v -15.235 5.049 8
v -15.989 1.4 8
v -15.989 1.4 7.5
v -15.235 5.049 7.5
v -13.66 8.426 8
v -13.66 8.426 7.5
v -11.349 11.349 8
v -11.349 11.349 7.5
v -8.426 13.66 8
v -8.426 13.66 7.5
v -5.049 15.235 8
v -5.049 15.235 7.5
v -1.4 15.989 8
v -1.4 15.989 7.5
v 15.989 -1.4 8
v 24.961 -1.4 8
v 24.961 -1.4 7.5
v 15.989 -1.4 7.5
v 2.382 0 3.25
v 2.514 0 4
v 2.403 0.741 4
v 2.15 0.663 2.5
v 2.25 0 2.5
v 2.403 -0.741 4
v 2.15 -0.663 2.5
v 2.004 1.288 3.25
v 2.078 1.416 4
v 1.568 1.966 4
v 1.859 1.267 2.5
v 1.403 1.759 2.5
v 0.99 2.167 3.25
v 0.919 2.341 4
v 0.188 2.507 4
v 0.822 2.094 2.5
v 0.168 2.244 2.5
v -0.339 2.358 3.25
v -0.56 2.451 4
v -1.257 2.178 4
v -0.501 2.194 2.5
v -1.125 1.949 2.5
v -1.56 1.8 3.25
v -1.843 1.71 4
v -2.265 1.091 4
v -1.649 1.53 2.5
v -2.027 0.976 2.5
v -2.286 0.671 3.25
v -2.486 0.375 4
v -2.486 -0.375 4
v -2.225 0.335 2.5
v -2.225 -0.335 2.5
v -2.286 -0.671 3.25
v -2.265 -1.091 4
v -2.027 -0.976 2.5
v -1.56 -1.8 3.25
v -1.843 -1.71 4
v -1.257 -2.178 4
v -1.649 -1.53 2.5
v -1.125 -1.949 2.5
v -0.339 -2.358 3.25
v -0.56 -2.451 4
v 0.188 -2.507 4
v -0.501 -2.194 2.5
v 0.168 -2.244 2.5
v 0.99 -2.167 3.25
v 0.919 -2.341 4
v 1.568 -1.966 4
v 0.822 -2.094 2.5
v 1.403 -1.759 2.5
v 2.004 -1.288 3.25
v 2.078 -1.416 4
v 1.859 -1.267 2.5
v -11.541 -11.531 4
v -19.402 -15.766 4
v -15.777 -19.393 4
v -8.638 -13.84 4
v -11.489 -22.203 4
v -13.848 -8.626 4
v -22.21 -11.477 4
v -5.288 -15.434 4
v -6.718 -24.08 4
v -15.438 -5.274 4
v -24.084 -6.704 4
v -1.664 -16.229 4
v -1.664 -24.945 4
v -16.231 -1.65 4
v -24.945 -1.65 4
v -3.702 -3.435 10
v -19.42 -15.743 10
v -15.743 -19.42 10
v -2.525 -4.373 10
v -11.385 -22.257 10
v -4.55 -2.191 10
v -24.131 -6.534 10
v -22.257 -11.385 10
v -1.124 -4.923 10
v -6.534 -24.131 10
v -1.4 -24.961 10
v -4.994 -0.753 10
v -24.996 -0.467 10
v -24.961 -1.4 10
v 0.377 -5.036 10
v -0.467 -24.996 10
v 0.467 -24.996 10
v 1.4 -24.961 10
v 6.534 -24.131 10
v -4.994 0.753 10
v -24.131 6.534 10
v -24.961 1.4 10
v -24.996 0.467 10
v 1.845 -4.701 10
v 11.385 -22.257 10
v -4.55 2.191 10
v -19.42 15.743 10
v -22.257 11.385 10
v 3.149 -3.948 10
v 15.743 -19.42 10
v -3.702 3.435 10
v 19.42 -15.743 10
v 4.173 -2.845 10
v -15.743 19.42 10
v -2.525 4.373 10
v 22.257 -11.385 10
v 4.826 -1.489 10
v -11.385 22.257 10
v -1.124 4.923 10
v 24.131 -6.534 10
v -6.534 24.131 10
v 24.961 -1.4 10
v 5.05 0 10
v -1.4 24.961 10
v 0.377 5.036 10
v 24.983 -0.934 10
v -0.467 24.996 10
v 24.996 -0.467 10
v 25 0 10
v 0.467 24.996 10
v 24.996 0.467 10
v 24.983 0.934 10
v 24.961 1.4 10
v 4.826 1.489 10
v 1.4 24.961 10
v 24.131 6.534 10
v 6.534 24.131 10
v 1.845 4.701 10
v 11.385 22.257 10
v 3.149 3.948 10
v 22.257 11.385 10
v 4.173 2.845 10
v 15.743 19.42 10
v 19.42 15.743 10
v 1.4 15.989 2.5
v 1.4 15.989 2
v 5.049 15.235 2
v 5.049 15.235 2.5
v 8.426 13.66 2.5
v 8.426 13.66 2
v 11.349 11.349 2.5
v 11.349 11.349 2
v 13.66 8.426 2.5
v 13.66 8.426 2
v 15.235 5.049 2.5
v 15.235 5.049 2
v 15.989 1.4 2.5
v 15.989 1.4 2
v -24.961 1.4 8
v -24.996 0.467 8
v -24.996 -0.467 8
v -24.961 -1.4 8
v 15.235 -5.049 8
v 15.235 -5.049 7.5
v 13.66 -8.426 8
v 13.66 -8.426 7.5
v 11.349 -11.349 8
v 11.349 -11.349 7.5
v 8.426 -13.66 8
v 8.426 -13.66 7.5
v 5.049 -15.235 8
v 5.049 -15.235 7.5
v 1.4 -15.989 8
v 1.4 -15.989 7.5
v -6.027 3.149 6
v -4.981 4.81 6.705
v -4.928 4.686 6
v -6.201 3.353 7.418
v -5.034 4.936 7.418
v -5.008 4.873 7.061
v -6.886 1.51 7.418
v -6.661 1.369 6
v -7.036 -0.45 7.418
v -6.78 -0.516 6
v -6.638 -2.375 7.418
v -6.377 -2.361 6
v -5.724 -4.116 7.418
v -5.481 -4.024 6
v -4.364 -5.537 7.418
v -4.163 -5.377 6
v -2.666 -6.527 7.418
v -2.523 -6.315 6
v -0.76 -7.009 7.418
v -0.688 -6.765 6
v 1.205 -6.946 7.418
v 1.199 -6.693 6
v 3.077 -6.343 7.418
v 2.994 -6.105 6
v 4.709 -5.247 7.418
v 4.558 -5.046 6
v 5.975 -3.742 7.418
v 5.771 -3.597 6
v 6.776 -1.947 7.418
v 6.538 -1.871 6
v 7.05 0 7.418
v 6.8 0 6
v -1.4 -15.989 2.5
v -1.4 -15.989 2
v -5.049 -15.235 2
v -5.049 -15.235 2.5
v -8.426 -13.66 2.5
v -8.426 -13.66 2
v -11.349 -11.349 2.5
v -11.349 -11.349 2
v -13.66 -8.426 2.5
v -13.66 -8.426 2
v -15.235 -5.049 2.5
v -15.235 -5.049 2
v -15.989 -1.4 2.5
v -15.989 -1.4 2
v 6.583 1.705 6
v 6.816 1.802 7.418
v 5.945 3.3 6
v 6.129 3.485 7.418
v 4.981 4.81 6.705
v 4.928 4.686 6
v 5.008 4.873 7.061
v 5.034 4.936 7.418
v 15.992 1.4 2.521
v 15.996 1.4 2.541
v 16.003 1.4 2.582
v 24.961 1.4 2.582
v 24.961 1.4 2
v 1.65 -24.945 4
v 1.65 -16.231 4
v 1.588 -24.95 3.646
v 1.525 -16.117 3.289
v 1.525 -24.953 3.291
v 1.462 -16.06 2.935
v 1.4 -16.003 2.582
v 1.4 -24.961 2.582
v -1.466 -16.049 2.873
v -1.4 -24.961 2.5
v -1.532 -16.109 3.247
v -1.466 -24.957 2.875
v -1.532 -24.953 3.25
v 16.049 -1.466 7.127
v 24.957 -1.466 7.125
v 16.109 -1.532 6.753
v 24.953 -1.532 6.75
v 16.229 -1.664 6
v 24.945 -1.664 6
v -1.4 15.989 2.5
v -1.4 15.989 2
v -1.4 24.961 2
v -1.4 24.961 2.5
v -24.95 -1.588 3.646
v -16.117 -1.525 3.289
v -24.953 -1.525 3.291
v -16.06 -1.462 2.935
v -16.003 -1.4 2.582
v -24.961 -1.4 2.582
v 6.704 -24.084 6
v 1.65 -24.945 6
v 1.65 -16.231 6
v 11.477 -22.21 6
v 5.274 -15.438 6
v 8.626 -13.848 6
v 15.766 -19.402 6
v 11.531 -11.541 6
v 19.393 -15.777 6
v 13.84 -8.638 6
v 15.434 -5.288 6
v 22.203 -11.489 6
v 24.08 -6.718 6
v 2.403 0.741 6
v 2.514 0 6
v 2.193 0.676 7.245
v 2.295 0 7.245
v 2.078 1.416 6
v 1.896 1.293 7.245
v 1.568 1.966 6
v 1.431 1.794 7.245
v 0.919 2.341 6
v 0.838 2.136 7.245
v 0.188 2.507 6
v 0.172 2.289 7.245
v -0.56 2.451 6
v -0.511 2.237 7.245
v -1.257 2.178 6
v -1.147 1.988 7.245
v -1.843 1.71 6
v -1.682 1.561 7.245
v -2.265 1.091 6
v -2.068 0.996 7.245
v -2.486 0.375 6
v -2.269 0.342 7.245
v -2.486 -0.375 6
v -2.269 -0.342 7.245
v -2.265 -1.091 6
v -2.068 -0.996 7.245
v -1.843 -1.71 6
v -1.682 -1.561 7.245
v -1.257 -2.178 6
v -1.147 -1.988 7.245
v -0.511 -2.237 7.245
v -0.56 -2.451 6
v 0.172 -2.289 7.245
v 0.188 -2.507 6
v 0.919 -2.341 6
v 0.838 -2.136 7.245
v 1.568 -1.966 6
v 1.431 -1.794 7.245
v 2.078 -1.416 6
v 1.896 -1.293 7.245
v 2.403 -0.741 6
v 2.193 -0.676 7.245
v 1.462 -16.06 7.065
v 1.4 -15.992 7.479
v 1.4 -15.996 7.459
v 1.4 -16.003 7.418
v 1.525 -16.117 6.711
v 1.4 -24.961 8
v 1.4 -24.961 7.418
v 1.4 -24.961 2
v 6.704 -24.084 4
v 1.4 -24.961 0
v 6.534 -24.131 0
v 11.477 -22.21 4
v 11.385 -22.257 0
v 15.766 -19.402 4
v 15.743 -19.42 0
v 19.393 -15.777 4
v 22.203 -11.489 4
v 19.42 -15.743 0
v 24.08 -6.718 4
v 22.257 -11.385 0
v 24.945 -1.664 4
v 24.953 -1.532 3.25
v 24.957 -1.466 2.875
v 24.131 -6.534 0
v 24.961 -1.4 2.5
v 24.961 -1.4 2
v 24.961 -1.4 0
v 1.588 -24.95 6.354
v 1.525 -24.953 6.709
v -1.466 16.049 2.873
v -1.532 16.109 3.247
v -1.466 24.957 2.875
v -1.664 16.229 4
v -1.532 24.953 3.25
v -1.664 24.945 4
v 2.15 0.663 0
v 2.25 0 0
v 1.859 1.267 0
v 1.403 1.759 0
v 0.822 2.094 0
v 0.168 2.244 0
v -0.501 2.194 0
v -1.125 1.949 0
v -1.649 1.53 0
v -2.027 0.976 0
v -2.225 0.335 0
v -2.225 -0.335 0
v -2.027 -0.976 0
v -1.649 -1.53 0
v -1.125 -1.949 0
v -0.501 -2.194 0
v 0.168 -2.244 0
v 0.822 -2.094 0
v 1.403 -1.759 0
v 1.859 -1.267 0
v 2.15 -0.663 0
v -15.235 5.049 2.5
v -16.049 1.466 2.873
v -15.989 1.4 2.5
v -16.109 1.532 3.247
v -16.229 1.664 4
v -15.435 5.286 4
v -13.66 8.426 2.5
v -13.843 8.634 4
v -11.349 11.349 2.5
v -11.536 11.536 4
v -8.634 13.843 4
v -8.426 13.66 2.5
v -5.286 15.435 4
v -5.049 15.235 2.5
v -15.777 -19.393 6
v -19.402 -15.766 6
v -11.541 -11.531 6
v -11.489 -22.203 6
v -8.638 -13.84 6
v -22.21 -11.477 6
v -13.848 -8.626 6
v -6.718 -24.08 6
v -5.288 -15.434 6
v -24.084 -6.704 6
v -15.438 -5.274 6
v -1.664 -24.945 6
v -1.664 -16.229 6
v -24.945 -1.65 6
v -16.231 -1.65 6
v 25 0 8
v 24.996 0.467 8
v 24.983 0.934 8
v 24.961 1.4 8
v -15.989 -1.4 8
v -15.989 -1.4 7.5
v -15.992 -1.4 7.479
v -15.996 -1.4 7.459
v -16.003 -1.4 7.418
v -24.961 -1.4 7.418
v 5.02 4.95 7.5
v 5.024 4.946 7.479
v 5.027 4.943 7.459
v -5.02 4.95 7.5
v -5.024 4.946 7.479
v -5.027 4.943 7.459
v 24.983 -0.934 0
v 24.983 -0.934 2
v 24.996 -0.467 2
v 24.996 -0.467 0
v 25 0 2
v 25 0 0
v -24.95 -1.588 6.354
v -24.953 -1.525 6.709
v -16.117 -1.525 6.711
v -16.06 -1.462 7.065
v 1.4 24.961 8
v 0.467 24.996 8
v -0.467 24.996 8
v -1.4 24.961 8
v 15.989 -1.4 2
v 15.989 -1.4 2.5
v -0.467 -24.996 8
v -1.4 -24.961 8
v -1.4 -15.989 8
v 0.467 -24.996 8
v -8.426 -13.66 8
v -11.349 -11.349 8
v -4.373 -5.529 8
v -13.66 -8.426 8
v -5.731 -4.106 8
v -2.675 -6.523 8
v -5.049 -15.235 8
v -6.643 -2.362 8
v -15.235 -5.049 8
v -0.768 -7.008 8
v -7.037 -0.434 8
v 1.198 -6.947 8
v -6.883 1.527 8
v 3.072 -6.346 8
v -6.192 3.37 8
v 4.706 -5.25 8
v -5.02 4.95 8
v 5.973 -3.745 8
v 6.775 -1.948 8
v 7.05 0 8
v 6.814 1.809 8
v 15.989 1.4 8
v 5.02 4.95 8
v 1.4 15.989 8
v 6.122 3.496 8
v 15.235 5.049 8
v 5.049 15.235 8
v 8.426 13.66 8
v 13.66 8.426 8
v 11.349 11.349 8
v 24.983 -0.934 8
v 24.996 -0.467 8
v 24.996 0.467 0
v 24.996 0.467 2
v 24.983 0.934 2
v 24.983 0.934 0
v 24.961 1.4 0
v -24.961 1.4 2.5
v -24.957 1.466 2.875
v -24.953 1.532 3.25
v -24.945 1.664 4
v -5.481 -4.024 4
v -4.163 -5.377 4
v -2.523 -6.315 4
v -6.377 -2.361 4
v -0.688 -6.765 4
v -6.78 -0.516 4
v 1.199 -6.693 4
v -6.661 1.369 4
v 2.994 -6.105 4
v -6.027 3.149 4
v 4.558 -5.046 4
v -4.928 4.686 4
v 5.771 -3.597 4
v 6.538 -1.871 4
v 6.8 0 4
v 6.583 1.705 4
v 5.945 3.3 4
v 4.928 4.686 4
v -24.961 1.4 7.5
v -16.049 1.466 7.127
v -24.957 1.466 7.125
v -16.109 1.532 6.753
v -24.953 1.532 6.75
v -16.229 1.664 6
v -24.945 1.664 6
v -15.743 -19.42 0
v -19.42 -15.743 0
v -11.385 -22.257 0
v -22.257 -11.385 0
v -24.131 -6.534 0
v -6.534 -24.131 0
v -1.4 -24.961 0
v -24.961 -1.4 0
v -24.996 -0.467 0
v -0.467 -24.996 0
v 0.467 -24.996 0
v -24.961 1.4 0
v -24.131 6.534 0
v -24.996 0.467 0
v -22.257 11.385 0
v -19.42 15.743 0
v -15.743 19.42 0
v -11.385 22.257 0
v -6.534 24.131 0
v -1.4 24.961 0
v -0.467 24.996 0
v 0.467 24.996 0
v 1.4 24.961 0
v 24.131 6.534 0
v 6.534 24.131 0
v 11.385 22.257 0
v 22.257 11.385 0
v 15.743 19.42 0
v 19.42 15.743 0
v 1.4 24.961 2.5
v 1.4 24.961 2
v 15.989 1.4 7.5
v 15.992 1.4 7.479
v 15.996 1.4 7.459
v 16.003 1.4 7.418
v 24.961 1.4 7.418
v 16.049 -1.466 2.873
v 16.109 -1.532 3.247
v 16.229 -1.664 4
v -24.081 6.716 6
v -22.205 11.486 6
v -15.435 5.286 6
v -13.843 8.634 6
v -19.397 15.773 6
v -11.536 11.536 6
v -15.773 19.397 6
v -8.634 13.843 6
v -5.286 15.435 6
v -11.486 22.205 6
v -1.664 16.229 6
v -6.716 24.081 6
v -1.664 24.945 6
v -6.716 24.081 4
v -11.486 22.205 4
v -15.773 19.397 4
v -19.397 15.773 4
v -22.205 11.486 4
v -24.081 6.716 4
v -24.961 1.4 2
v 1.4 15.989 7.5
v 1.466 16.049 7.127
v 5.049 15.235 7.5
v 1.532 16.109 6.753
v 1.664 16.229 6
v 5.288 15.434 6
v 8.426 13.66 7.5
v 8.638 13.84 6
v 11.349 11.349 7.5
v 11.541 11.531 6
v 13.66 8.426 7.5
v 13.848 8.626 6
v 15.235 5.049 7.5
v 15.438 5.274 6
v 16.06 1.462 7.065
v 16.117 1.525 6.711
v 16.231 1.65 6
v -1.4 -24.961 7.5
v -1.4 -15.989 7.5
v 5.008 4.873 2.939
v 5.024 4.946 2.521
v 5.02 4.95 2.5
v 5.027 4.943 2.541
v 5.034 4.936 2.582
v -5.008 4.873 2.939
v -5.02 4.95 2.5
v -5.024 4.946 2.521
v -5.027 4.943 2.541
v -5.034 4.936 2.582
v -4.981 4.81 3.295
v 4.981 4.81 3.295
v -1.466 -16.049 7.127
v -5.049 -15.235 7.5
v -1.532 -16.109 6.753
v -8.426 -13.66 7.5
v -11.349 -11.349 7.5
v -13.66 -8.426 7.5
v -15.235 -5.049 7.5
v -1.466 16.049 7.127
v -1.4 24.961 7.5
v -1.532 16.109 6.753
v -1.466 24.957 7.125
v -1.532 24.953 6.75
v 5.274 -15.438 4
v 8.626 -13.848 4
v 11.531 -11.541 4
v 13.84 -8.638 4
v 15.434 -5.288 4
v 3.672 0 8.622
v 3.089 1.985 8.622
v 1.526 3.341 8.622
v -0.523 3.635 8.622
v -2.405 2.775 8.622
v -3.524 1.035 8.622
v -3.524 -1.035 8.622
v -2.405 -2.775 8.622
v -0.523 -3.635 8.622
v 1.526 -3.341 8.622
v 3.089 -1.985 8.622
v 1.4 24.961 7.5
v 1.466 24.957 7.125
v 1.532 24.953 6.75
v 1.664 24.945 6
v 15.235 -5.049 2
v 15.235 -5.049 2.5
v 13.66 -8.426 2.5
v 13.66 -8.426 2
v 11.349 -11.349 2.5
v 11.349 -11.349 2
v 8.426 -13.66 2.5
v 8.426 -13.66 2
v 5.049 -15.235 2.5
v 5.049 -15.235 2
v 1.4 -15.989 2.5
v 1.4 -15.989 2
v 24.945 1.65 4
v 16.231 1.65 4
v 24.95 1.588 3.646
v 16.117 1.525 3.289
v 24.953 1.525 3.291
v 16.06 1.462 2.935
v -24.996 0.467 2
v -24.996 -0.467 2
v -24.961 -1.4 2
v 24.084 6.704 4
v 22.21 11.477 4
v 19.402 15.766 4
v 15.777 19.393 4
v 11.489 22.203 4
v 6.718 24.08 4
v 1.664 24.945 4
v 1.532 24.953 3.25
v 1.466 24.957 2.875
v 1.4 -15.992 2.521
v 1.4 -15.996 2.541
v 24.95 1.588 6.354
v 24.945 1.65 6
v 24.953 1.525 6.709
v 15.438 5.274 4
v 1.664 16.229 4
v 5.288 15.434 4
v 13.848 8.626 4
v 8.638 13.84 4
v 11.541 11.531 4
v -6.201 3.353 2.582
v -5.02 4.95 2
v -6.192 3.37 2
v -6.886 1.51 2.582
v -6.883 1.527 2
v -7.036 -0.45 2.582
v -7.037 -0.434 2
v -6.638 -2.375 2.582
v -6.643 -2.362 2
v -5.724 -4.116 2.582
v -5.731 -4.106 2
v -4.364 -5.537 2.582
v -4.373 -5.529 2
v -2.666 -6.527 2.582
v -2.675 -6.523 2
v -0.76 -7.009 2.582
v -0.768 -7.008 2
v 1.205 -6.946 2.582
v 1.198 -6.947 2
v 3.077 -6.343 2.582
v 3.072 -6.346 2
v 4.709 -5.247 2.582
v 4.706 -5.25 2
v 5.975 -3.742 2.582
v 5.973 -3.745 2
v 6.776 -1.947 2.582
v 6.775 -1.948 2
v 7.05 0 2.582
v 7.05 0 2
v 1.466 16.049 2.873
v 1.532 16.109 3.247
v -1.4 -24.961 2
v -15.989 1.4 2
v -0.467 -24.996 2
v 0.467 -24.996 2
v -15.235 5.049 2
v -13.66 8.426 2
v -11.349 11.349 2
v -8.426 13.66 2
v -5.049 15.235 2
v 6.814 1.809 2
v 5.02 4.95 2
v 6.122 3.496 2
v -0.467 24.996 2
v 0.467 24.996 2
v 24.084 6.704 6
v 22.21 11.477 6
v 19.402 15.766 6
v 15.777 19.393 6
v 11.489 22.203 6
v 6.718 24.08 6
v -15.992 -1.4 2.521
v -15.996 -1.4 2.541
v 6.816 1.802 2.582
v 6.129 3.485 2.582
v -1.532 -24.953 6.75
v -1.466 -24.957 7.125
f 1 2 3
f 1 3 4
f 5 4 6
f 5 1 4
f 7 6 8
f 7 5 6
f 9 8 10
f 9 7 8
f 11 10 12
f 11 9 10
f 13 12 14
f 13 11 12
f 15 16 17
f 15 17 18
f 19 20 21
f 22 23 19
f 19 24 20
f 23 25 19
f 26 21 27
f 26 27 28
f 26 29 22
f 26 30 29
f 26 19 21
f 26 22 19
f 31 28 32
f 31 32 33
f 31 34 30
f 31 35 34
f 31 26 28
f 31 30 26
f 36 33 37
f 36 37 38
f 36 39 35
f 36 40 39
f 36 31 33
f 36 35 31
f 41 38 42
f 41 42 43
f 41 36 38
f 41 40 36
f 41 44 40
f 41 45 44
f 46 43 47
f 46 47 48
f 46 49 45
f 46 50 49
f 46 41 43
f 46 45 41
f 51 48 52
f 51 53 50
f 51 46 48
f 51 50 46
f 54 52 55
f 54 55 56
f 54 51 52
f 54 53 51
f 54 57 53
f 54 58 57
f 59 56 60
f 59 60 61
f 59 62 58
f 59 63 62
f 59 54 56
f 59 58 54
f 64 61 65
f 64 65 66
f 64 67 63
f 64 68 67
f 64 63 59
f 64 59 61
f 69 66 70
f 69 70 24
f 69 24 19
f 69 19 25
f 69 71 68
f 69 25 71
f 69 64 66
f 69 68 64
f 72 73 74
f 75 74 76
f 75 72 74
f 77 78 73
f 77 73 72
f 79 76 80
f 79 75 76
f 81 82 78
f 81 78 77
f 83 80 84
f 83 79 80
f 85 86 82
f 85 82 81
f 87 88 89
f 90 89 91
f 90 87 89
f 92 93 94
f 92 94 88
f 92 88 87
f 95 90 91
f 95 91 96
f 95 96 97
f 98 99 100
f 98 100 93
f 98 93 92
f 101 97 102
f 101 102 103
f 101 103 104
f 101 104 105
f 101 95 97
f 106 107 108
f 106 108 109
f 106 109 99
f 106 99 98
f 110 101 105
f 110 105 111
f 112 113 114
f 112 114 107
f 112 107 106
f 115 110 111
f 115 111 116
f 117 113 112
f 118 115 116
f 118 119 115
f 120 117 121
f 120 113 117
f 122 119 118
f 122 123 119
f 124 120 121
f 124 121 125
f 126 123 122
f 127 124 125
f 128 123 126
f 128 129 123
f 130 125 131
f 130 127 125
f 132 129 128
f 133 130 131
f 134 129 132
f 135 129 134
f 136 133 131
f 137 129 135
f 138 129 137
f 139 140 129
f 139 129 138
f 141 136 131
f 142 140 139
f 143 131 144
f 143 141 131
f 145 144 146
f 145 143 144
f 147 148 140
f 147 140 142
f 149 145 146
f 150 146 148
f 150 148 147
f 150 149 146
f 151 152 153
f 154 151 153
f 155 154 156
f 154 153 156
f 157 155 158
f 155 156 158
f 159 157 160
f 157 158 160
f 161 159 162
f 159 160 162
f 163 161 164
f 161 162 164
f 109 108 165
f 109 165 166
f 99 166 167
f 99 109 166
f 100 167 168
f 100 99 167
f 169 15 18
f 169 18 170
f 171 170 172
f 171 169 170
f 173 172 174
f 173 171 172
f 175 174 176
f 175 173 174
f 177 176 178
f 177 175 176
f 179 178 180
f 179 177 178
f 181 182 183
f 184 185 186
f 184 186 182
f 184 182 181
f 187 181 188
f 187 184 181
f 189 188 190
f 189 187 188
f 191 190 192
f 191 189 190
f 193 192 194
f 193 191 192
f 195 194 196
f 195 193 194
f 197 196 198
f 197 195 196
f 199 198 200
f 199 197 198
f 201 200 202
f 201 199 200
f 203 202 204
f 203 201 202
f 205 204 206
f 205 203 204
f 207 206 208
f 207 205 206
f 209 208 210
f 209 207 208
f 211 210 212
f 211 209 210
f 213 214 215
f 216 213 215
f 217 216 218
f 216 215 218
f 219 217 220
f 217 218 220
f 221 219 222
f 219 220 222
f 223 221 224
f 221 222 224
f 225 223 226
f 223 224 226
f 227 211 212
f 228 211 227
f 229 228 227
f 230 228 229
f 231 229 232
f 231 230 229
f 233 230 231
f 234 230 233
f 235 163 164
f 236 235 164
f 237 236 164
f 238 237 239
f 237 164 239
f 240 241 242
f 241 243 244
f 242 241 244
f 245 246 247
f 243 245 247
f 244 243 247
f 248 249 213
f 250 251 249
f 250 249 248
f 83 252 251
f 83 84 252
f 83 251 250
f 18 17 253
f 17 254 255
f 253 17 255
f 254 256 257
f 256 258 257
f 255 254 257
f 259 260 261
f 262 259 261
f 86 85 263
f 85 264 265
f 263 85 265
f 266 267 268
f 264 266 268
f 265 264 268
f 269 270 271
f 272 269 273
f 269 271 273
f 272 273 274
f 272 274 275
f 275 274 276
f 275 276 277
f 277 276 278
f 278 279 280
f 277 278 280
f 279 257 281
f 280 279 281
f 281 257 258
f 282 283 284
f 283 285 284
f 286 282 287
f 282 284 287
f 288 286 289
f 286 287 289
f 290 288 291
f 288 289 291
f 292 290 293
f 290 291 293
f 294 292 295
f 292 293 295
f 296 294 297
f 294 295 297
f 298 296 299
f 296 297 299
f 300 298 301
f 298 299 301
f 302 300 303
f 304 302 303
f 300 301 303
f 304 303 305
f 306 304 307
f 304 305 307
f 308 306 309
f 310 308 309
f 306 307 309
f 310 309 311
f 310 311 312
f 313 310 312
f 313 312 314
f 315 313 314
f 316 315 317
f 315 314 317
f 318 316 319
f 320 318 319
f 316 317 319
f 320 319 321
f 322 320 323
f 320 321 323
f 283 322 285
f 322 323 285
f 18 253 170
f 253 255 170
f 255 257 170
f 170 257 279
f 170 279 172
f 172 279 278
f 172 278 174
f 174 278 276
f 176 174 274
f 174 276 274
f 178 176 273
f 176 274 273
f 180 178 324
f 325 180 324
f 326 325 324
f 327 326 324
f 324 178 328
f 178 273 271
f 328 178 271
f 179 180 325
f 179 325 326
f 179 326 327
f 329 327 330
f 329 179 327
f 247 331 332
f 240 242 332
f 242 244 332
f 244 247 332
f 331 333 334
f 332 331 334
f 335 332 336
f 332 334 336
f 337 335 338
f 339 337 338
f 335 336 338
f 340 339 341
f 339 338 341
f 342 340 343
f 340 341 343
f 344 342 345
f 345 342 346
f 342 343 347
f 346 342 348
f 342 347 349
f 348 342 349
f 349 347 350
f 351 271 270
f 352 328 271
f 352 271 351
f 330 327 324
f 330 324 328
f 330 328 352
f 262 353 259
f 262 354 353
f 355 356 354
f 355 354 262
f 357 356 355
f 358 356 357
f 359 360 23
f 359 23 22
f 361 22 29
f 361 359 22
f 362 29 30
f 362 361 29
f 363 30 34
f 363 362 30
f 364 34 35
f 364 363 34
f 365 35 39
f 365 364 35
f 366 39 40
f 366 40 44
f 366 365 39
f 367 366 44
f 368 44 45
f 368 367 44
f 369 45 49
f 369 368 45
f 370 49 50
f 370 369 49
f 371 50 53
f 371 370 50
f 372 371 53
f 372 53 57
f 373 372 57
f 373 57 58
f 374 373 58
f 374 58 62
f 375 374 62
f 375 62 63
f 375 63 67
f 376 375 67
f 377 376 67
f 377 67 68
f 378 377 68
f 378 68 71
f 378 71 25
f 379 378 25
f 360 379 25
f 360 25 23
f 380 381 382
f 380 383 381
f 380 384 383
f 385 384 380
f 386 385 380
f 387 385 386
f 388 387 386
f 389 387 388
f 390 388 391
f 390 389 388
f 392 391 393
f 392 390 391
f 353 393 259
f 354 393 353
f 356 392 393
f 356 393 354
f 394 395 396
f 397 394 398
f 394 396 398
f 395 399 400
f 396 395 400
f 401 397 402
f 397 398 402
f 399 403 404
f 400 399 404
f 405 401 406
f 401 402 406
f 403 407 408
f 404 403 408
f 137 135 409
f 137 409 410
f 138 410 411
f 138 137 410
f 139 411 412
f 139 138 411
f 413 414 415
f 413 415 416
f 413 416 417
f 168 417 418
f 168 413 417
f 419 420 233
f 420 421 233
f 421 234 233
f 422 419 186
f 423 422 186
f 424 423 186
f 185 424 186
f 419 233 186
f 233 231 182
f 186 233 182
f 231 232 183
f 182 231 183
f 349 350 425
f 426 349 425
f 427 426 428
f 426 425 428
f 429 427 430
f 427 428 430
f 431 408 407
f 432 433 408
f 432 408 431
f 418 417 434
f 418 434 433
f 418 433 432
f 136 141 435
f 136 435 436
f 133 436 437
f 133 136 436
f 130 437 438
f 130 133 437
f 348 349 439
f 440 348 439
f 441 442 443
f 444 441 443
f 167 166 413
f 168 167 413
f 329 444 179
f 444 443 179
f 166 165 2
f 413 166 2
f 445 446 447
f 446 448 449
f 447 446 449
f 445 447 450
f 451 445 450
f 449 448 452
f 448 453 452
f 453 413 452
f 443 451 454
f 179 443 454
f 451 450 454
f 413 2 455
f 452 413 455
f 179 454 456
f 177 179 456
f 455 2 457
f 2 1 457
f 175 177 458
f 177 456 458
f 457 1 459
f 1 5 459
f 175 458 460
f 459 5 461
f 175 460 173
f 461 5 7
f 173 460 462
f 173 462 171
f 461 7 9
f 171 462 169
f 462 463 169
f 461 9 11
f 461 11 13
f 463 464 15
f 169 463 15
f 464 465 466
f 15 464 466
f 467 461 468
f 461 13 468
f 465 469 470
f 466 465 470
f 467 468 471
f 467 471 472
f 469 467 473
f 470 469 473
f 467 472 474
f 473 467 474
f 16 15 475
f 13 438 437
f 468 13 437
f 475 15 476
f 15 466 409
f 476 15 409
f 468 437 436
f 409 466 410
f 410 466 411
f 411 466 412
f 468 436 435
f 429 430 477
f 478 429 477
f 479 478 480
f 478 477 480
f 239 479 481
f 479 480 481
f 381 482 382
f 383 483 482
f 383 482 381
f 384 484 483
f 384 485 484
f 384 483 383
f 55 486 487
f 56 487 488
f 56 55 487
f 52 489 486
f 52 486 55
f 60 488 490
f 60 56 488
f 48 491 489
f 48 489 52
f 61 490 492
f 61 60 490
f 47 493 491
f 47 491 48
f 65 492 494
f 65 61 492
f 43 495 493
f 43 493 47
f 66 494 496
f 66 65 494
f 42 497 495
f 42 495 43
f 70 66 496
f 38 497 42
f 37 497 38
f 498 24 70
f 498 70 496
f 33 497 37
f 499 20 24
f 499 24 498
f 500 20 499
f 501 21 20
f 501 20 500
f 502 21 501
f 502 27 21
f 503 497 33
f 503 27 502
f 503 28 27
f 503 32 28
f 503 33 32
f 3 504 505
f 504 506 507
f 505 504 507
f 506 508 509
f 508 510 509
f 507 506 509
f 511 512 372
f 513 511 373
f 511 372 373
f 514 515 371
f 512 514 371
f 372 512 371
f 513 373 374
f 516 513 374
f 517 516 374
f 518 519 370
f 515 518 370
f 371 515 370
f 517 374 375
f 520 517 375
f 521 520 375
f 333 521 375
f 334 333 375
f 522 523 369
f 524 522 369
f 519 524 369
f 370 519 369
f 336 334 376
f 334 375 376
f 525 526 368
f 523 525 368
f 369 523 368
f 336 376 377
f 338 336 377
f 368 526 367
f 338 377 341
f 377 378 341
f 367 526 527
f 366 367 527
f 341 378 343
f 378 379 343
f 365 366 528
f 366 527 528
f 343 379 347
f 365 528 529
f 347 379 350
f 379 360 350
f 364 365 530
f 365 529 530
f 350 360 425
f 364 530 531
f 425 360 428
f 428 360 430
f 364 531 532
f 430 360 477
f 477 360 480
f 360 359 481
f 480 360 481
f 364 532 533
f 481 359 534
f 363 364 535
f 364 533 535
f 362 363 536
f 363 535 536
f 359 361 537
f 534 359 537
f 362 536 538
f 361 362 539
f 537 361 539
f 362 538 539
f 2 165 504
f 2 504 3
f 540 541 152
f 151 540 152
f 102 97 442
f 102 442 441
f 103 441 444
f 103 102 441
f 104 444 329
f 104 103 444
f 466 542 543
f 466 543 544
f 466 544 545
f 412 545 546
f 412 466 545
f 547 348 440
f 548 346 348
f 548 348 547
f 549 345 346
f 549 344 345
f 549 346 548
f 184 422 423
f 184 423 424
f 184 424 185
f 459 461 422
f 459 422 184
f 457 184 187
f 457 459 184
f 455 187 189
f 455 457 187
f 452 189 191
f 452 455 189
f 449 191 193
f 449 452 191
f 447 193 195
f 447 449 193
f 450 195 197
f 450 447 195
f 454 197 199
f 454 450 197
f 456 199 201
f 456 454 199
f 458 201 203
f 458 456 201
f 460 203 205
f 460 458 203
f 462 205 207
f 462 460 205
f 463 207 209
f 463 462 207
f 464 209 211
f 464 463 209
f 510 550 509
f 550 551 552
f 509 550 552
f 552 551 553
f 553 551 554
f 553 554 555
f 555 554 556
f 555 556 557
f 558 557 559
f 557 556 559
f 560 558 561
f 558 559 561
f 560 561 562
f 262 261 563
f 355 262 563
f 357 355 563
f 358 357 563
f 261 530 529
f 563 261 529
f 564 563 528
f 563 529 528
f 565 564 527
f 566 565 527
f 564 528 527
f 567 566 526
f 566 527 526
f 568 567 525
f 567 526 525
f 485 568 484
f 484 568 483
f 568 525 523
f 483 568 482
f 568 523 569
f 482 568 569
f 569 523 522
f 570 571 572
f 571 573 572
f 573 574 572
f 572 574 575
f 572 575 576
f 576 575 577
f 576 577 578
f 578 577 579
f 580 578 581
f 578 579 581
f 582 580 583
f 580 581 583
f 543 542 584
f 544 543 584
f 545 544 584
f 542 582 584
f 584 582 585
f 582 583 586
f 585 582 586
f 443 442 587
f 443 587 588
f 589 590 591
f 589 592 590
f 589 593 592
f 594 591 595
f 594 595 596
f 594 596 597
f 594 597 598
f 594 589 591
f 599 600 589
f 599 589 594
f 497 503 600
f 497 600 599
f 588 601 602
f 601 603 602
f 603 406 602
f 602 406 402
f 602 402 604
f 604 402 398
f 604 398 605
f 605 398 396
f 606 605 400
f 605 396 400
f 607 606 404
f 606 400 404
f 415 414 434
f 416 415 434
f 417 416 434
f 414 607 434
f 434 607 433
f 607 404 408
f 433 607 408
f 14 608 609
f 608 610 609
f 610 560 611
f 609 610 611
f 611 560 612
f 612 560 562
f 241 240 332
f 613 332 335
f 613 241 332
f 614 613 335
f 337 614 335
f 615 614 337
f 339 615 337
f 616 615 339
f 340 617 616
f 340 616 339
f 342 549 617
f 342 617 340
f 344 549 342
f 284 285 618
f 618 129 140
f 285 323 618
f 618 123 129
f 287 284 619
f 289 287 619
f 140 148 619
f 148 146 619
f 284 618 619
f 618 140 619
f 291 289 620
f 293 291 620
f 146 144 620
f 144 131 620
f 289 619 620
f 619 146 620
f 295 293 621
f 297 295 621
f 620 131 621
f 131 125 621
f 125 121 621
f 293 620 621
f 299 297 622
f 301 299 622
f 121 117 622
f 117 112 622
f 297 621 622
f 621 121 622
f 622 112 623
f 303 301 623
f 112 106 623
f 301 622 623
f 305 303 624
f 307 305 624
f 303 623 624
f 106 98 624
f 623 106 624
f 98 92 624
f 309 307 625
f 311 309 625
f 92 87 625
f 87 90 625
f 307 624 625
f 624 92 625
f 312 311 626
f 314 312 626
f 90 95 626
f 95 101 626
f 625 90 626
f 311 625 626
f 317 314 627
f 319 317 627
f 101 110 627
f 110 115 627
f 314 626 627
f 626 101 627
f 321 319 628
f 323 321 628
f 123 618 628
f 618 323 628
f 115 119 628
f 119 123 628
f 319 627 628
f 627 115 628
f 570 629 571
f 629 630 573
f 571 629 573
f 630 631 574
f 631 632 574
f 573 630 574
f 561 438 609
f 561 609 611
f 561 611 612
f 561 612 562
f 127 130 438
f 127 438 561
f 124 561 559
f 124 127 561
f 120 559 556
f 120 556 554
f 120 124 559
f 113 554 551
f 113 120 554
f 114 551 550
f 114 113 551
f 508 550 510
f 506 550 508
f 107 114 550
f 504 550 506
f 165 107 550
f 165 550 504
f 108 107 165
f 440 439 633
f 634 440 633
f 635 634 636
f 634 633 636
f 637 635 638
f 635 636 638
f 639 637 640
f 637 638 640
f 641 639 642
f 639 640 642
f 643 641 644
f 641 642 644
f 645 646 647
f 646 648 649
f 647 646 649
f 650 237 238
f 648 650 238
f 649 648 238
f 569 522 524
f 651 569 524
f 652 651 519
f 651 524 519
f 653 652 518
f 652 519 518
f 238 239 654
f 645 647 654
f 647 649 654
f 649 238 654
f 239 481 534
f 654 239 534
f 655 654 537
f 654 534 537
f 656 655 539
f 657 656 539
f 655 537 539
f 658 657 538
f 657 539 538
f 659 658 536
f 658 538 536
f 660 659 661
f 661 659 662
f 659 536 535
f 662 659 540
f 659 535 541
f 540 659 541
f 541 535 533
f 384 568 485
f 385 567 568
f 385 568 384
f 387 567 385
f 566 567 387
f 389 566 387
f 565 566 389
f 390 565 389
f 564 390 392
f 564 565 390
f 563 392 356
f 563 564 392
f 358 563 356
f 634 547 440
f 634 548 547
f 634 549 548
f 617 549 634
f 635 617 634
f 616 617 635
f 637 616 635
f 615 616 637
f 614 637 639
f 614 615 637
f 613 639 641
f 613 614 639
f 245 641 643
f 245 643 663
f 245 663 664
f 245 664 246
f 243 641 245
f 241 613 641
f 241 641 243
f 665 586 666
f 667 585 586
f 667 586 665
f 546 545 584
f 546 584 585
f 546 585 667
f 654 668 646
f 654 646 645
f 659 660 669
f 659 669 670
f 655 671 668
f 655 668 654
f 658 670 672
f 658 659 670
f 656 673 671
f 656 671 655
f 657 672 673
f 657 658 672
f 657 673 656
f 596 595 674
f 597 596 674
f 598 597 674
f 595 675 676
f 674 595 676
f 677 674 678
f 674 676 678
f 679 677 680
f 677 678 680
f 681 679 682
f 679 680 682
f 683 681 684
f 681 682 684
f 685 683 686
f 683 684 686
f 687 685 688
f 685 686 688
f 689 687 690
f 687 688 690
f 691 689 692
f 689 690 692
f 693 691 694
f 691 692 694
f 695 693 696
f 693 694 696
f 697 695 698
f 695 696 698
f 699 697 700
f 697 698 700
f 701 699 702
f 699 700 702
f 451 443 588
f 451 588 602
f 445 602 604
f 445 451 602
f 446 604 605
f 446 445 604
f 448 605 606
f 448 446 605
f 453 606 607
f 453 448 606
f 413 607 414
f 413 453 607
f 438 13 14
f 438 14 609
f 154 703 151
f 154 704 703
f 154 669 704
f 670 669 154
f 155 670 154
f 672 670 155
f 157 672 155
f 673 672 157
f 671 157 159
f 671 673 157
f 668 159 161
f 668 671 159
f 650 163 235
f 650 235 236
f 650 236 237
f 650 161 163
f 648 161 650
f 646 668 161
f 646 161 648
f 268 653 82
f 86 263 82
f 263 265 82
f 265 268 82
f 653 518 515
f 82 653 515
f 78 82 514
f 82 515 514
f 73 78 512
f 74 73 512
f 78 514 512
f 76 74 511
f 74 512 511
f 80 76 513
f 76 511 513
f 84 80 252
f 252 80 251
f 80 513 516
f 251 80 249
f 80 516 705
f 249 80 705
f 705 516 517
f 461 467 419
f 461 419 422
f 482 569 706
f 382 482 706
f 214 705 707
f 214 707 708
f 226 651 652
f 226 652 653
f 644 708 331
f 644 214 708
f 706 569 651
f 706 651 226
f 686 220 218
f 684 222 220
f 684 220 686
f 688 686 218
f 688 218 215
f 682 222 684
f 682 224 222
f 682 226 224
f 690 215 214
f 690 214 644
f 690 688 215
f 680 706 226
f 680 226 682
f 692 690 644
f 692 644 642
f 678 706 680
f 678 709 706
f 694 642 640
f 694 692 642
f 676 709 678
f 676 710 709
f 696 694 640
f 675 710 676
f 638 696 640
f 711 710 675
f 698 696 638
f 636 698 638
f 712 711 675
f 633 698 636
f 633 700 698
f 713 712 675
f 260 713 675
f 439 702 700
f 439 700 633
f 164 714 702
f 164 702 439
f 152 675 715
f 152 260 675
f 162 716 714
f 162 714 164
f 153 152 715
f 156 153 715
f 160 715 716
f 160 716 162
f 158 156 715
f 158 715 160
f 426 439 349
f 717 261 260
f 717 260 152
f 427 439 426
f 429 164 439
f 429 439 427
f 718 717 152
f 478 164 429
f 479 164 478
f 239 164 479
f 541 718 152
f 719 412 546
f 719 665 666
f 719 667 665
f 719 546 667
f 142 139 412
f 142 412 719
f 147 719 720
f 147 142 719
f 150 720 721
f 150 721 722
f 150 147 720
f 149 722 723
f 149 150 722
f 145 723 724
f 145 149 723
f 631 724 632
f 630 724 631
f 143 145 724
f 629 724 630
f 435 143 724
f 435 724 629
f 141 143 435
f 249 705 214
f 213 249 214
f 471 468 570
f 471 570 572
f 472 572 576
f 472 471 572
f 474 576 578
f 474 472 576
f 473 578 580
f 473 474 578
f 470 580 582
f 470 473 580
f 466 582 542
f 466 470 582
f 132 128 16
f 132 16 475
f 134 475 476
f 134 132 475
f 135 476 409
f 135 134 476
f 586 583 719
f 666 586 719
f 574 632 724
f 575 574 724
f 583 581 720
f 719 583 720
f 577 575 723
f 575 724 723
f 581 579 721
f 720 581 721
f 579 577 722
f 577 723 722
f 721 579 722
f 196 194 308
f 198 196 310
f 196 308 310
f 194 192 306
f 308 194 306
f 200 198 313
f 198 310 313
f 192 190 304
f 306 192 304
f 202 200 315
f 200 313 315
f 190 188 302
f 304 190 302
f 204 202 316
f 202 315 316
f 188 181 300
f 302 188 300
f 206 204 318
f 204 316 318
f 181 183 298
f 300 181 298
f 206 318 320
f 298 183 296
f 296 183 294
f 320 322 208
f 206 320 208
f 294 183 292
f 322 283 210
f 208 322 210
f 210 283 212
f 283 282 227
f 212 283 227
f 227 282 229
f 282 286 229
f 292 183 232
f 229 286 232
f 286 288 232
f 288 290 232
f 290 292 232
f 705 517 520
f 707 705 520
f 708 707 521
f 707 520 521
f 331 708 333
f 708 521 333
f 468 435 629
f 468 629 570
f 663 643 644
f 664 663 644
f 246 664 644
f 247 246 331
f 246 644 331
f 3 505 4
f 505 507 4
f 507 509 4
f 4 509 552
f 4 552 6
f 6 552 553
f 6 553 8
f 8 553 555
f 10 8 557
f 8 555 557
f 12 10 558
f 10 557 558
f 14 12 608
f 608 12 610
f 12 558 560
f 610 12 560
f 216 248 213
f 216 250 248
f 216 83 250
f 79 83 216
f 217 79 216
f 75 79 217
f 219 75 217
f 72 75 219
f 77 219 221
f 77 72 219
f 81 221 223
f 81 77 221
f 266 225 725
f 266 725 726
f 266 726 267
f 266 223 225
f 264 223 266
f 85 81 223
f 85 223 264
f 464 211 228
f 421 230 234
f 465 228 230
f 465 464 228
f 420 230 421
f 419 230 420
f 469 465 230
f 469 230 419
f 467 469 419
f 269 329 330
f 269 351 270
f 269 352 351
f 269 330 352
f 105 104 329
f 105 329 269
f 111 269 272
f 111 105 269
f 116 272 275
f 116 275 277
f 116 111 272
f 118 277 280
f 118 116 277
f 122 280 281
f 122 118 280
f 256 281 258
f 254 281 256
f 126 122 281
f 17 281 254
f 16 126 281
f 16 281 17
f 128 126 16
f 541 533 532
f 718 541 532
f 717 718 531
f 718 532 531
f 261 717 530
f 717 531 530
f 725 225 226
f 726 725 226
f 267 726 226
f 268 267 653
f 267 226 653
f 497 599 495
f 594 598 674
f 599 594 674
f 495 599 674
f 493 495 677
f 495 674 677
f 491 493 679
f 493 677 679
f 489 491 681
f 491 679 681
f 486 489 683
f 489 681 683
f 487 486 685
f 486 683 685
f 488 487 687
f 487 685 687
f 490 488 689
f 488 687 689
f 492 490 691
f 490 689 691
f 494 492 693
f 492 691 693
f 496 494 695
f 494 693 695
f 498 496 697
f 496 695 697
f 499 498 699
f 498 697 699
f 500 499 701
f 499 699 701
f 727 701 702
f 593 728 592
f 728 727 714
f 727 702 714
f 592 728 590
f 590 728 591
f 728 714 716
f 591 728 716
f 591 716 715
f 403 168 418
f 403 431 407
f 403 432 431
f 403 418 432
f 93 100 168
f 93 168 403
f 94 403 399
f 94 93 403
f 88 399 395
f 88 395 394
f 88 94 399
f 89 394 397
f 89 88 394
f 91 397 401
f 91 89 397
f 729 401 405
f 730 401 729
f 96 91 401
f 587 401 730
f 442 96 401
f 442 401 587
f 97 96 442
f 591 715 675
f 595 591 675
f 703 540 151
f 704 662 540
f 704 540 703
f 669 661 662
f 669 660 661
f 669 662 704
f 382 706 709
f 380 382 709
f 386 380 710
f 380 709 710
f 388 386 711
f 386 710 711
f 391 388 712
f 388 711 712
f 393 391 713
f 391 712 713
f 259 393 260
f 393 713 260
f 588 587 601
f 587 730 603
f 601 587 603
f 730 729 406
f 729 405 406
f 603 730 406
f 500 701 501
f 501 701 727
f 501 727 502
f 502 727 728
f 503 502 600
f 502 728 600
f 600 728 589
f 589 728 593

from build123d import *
from build123d import SkipClean  # not in build123d's __all__

# Parameters (mm, degrees)
F0_R         = 2.25
F1_DEPTH     = 2
F2_DEPTH     = 4
F3_SIZE2     = 1.4178204549
F3_SIZE      = 0.25
F3_2_SIZE2   = 1.4178204549
F3_2_SIZE    = 0.25
F3_3_SIZE2   = 1.4178204549
F3_3_SIZE    = 0.25
F3_4_SIZE2   = 1.4178204549
F3_4_SIZE    = 0.25
F4_C1_SIZE2  = 0.2644904711
F4_C1_SIZE   = 1.5
F4_C2_SIZE2  = 0.2644904711
F4_C2_SIZE   = 1.5
F4_C3_SIZE2  = 0.2644904711
F4_C3_SIZE   = 1.5
F4_C4_SIZE2  = 0.2644904711
F4_C4_SIZE   = 1.5
F4_C5_SIZE2  = 0.2644904711
F4_C5_SIZE   = 1.5
F4_C6_SIZE2  = 0.2644904711
F4_C6_SIZE   = 1.5
F4_C7_SIZE2  = 0.2644904711
F4_C7_SIZE   = 1.5
F4_C8_SIZE2  = 0.2644904711
F4_C8_SIZE   = 1.5
F4_C9_SIZE2  = 0.2644904711
F4_C9_SIZE   = 1.5
F4_C10_SIZE2 = 0.2644904711
F4_C10_SIZE  = 1.5
F4_C11_SIZE2 = 1.5
F4_C11_SIZE  = 0.2644904711


# Not quite as in the source:
# - a fillet or chamfer that OpenCascade refuses, or shapes differently, is made with other operations: its cross-section is extruded or revolved along the edge and cut away or added


with BuildPart() as f1:
    # F0 (on Top) → F1 (new body)
    with BuildSketch(Plane.XY):
        with BuildLine():
            ThreePointArc((15.9888242219, -1.4), (16.0346987618, -0.7006679805), (16.05, 0))
            ThreePointArc((16.05, 0), (16.0346987618, 0.7006679805), (15.9888242219, 1.4))
            ThreePointArc((15.9888242219, 1.4), (11.349063838, 11.349063838), (1.4, 15.9888242219))
            ThreePointArc((1.4, 15.9888242219), (0, 16.05), (-1.4, 15.9888242219))
            ThreePointArc((-1.4, 15.9888242219), (-11.349063838, 11.349063838), (-15.9888242219, 1.4))
            ThreePointArc((-15.9888242219, 1.4), (-16.05, 0), (-15.9888242219, -1.4))
            ThreePointArc((-15.9888242219, -1.4), (-11.349063838, -11.349063838), (-1.4, -15.9888242219))
            ThreePointArc((-1.4, -15.9888242219), (0, -16.05), (1.4, -15.9888242219))
            ThreePointArc((1.4, -15.9888242219), (11.349063838, -11.349063838), (15.9888242219, -1.4))
        make_face()
        with BuildLine():
            ThreePointArc((5.0199601592, 4.95), (6.5227762158, 2.6750496143), (7.05, 0))
            ThreePointArc((7.05, 0), (-2.6750496143, -6.5227762158), (-5.0199601592, 4.95))
            ThreePointArc((-5.0199601592, 4.95), (0, 7.05), (5.0199601592, 4.95))
        make_face(mode=Mode.SUBTRACT)
        with BuildLine():
            ThreePointArc((-5.0199601592, 4.95), (-2.6750496143, -6.5227762158), (7.05, 0))
            ThreePointArc((7.05, 0), (6.5227762158, 2.6750496143), (5.0199601592, 4.95))
            Line((5.0199601592, 4.95), (-5.0199601592, 4.95))
        make_face()
        Circle(F0_R, mode=Mode.SUBTRACT)
        with BuildLine():
            Line((-5.0199601592, 4.95), (5.0199601592, 4.95))
            ThreePointArc((5.0199601592, 4.95), (0, 7.05), (-5.0199601592, 4.95))
        make_face()
        with BuildLine():
            ThreePointArc((1.4, 15.9888242219), (11.349063838, 11.349063838), (15.9888242219, 1.4))
            Line((15.9888242219, 1.4), (24.9607692189, 1.4))
            ThreePointArc((24.9607692189, 1.4), (17.6776695297, 17.6776695297), (1.4, 24.9607692189))
            Line((1.4, 24.9607692189), (1.4, 15.9888242219))
        make_face()
        with BuildLine():
            ThreePointArc((-15.9888242219, 1.4), (-11.349063838, 11.349063838), (-1.4, 15.9888242219))
            Line((-1.4, 15.9888242219), (-1.4, 24.9607692189))
            ThreePointArc((-1.4, 24.9607692189), (-17.6776695297, 17.6776695297), (-24.9607692189, 1.4))
            Line((-24.9607692189, 1.4), (-15.9888242219, 1.4))
        make_face()
        with BuildLine():
            ThreePointArc((-1.4, 15.9888242219), (0, 16.05), (1.4, 15.9888242219))
            Line((1.4, 15.9888242219), (1.4, 24.9607692189))
            ThreePointArc((1.4, 24.9607692189), (0, 25), (-1.4, 24.9607692189))
            Line((-1.4, 24.9607692189), (-1.4, 15.9888242219))
        make_face()
        with BuildLine():
            ThreePointArc((-15.9888242219, -1.4), (-16.05, 0), (-15.9888242219, 1.4))
            Line((-15.9888242219, 1.4), (-24.9607692189, 1.4))
            ThreePointArc((-24.9607692189, 1.4), (-25, 0), (-24.9607692189, -1.4))
            Line((-24.9607692189, -1.4), (-15.9888242219, -1.4))
        make_face()
        with BuildLine():
            Line((-1.4, -24.9607692189), (-1.4, -15.9888242219))
            ThreePointArc((-1.4, -15.9888242219), (-11.349063838, -11.349063838), (-15.9888242219, -1.4))
            Line((-15.9888242219, -1.4), (-24.9607692189, -1.4))
            ThreePointArc((-24.9607692189, -1.4), (-17.6776695297, -17.6776695297), (-1.4, -24.9607692189))
        make_face()
        with BuildLine():
            Line((1.4, -24.9607692189), (1.4, -15.9888242219))
            ThreePointArc((1.4, -15.9888242219), (0, -16.05), (-1.4, -15.9888242219))
            Line((-1.4, -15.9888242219), (-1.4, -24.9607692189))
            ThreePointArc((-1.4, -24.9607692189), (0, -25), (1.4, -24.9607692189))
        make_face()
        with BuildLine():
            Line((24.9607692189, -1.4), (15.9888242219, -1.4))
            ThreePointArc((15.9888242219, -1.4), (11.349063838, -11.349063838), (1.4, -15.9888242219))
            Line((1.4, -15.9888242219), (1.4, -24.9607692189))
            ThreePointArc((1.4, -24.9607692189), (17.6776695297, -17.6776695297), (24.9607692189, -1.4))
        make_face()
        with BuildLine():
            ThreePointArc((15.9888242219, 1.4), (16.0346987618, 0.7006679805), (16.05, 0))
            ThreePointArc((16.05, 0), (16.0346987618, -0.7006679805), (15.9888242219, -1.4))
            Line((15.9888242219, -1.4), (24.9607692189, -1.4))
            ThreePointArc((24.9607692189, -1.4), (24.9901903802, -0.7002747772), (25, 0))
            ThreePointArc((25, 0), (24.9901903802, 0.7002747772), (24.9607692189, 1.4))
            Line((24.9607692189, 1.4), (15.9888242219, 1.4))
        make_face()
    extrude(amount=F1_DEPTH)

    # F0 (on Top) → F2 (join)
    with BuildSketch(Plane.XY):
        with BuildLine():
            ThreePointArc((-5.0199601592, 4.95), (-2.6750496143, -6.5227762158), (7.05, 0))
            ThreePointArc((7.05, 0), (6.5227762158, 2.6750496143), (5.0199601592, 4.95))
            Line((5.0199601592, 4.95), (-5.0199601592, 4.95))
        make_face()
        Circle(F0_R, mode=Mode.SUBTRACT)
        with BuildLine():
            Line((24.9607692189, -1.4), (15.9888242219, -1.4))
            ThreePointArc((15.9888242219, -1.4), (11.349063838, -11.349063838), (1.4, -15.9888242219))
            Line((1.4, -15.9888242219), (1.4, -24.9607692189))
            ThreePointArc((1.4, -24.9607692189), (17.6776695297, -17.6776695297), (24.9607692189, -1.4))
        make_face()
        with BuildLine():
            Line((-1.4, -24.9607692189), (-1.4, -15.9888242219))
            ThreePointArc((-1.4, -15.9888242219), (-11.349063838, -11.349063838), (-15.9888242219, -1.4))
            Line((-15.9888242219, -1.4), (-24.9607692189, -1.4))
            ThreePointArc((-24.9607692189, -1.4), (-17.6776695297, -17.6776695297), (-1.4, -24.9607692189))
        make_face()
        with BuildLine():
            ThreePointArc((-15.9888242219, 1.4), (-11.349063838, 11.349063838), (-1.4, 15.9888242219))
            Line((-1.4, 15.9888242219), (-1.4, 24.9607692189))
            ThreePointArc((-1.4, 24.9607692189), (-17.6776695297, 17.6776695297), (-24.9607692189, 1.4))
            Line((-24.9607692189, 1.4), (-15.9888242219, 1.4))
        make_face()
        with BuildLine():
            ThreePointArc((1.4, 15.9888242219), (11.349063838, 11.349063838), (15.9888242219, 1.4))
            Line((15.9888242219, 1.4), (24.9607692189, 1.4))
            ThreePointArc((24.9607692189, 1.4), (17.6776695297, 17.6776695297), (1.4, 24.9607692189))
            Line((1.4, 24.9607692189), (1.4, 15.9888242219))
        make_face()
    with SkipClean():  # cleaning this boolean's faces spoils the solid; the shape is the same uncleaned
        extrude(amount=F2_DEPTH)

    # F3
    f3_edges = [f1.edges().sort_by_distance(p)[0] for p in [
        (-20.474797, -1.4, 4),
    ]]
    f3_side = f1.faces().sort_by_distance((-13.527768, -13.527768, 4))[0]
    chamfer(f3_edges, length=F3_SIZE, length2=F3_SIZE2, reference=f3_side)

    # F3#2
    f3_2_edges = [f1.edges().sort_by_distance(p)[0] for p in [
        (20.474797, 1.4, 4),
    ]]
    f3_2_side = f1.faces().sort_by_distance((13.527768, 13.527768, 4))[0]
    chamfer(f3_2_edges, length=F3_2_SIZE, length2=F3_2_SIZE2, reference=f3_2_side)

    # F3#3
    f3_3_edges = [f1.edges().sort_by_distance(p)[0] for p in [
        (0, -7.05, 4),
    ]]
    f3_3_side = f1.faces().sort_by_distance((0, -6.864849, 4))[0]
    chamfer(f3_3_edges, length=F3_3_SIZE, length2=F3_3_SIZE2, reference=f3_3_side)

    # F3#4
    f3_4_edges = [f1.edges().sort_by_distance(p)[0] for p in [
        (1.4, -20.474797, 4),
    ]]
    f3_4_side = f1.faces().sort_by_distance((13.527768, -13.527768, 4))[0]
    chamfer(f3_4_edges, length=F3_4_SIZE, length2=F3_4_SIZE2, reference=f3_4_side)

    # F4: chamfer of 1.5 x 0.2644904711 on 11 edges, made by hand

    # F4_c1
    f4_c1_edges = [f1.edges().sort_by_distance(p)[0] for p in [
        (11.4375065831, -11.2599264279, 4),
    ]]
    f4_c1_side = f1.faces().sort_by_distance((11.4375065831, -11.2599264279, 3.9947101906))[0]
    chamfer(f4_c1_edges, length=F4_C1_SIZE, length2=F4_C1_SIZE2, reference=f4_c1_side)

    # F4_c2
    f4_c2_edges = [f1.edges().sort_by_distance(p)[0] for p in [
        (20.607539698, -1.4, 4),
    ]]
    f4_c2_side = f1.faces().sort_by_distance((20.607539698, -1.4, 3.9947101906))[0]
    chamfer(f4_c2_edges, length=F4_C2_SIZE, length2=F4_C2_SIZE2, reference=f4_c2_side)

    # F4_c3
    f4_c3_edges = [f1.edges().sort_by_distance(p)[0] for p in [
        (-1.4, -20.4747967204, 4),
    ]]
    f4_c3_side = f1.faces().sort_by_distance((-1.4, -20.4747967204, 3.9947101906))[0]
    chamfer(f4_c3_edges, length=F4_C3_SIZE, length2=F4_C3_SIZE2, reference=f4_c3_side)

    # F4_c4
    f4_c4_edges = [f1.edges().sort_by_distance(p)[0] for p in [
        (-11.3542133554, -11.3439119831, 4),
    ]]
    f4_c4_side = f1.faces().sort_by_distance((-11.3542133554, -11.3439119831, 3.9947101906))[0]
    chamfer(f4_c4_edges, length=F4_C4_SIZE, length2=F4_C4_SIZE2, reference=f4_c4_side)

    # F4_c5
    f4_c5_edges = [f1.edges().sort_by_distance(p)[0] for p in [
        (-20.4747967204, 1.4, 4),
    ]]
    f4_c5_side = f1.faces().sort_by_distance((-20.4747967204, 1.4, 3.9947101906))[0]
    chamfer(f4_c5_edges, length=F4_C5_SIZE, length2=F4_C5_SIZE2, reference=f4_c5_side)

    # F4_c6
    f4_c6_edges = [f1.edges().sort_by_distance(p)[0] for p in [
        (-11.2547344431, 11.442615637, 4),
    ]]
    f4_c6_side = f1.faces().sort_by_distance((-11.2547344431, 11.442615637, 3.9947101906))[0]
    chamfer(f4_c6_edges, length=F4_C6_SIZE, length2=F4_C6_SIZE2, reference=f4_c6_side)

    # F4_c7
    f4_c7_edges = [f1.edges().sort_by_distance(p)[0] for p in [
        (-1.4, 20.607539698, 4),
    ]]
    f4_c7_side = f1.faces().sort_by_distance((-1.4, 20.607539698, 3.9947101906))[0]
    chamfer(f4_c7_edges, length=F4_C7_SIZE, length2=F4_C7_SIZE2, reference=f4_c7_side)

    # F4_c8
    f4_c8_edges = [f1.edges().sort_by_distance(p)[0] for p in [
        (1.4, 20.4747967204, 4),
    ]]
    f4_c8_side = f1.faces().sort_by_distance((1.4, 20.4747967204, 3.9947101906))[0]
    chamfer(f4_c8_edges, length=F4_C8_SIZE, length2=F4_C8_SIZE2, reference=f4_c8_side)

    # F4_c9
    f4_c9_edges = [f1.edges().sort_by_distance(p)[0] for p in [
        (11.3542133554, 11.3439119831, 4),
    ]]
    f4_c9_side = f1.faces().sort_by_distance((11.3542133554, 11.3439119831, 3.9947101906))[0]
    chamfer(f4_c9_edges, length=F4_C9_SIZE, length2=F4_C9_SIZE2, reference=f4_c9_side)

    # F4_c10
    f4_c10_edges = [f1.edges().sort_by_distance(p)[0] for p in [
        (0, 4.95, 4),
    ]]
    f4_c10_side = f1.faces().sort_by_distance((0, 4.95, 3.9947101906))[0]
    chamfer(f4_c10_edges, length=F4_C10_SIZE, length2=F4_C10_SIZE2, reference=f4_c10_side)

    # F4_c11
    f4_c11_edges = [f1.edges().sort_by_distance(p)[0] for p in [
        (-2.25, 0, 4),
    ]]
    f4_c11_side = f1.faces().sort_by_distance((-2.2552898094, 0, 4))[0]
    chamfer(f4_c11_edges, length=F4_C11_SIZE, length2=F4_C11_SIZE2, reference=f4_c11_side)


with BuildPart() as f5_1:
    # F5: instance of F1
    add(f1.part.mirror(Plane.XY), clean=False)


with BuildPart() as f5_1_1:
    # F6: moved
    add(f5_1.part.moved(Location((0, 0, 10))), clean=False)

    # F7: chamfer of 2.8 on 1 edges, made by hand

    # F7_s1 → F7_t2 (revolve, cut)
    with BuildSketch(Plane.XZ):
        Polygon((2.25, 7.2), (5.05, 10), (2.25, 10), align=None)
    revolve(axis=Axis((0, 0, 10), (0, 0, 1)), mode=Mode.SUBTRACT)


solid = Compound([f1.part, f5_1_1.part])
